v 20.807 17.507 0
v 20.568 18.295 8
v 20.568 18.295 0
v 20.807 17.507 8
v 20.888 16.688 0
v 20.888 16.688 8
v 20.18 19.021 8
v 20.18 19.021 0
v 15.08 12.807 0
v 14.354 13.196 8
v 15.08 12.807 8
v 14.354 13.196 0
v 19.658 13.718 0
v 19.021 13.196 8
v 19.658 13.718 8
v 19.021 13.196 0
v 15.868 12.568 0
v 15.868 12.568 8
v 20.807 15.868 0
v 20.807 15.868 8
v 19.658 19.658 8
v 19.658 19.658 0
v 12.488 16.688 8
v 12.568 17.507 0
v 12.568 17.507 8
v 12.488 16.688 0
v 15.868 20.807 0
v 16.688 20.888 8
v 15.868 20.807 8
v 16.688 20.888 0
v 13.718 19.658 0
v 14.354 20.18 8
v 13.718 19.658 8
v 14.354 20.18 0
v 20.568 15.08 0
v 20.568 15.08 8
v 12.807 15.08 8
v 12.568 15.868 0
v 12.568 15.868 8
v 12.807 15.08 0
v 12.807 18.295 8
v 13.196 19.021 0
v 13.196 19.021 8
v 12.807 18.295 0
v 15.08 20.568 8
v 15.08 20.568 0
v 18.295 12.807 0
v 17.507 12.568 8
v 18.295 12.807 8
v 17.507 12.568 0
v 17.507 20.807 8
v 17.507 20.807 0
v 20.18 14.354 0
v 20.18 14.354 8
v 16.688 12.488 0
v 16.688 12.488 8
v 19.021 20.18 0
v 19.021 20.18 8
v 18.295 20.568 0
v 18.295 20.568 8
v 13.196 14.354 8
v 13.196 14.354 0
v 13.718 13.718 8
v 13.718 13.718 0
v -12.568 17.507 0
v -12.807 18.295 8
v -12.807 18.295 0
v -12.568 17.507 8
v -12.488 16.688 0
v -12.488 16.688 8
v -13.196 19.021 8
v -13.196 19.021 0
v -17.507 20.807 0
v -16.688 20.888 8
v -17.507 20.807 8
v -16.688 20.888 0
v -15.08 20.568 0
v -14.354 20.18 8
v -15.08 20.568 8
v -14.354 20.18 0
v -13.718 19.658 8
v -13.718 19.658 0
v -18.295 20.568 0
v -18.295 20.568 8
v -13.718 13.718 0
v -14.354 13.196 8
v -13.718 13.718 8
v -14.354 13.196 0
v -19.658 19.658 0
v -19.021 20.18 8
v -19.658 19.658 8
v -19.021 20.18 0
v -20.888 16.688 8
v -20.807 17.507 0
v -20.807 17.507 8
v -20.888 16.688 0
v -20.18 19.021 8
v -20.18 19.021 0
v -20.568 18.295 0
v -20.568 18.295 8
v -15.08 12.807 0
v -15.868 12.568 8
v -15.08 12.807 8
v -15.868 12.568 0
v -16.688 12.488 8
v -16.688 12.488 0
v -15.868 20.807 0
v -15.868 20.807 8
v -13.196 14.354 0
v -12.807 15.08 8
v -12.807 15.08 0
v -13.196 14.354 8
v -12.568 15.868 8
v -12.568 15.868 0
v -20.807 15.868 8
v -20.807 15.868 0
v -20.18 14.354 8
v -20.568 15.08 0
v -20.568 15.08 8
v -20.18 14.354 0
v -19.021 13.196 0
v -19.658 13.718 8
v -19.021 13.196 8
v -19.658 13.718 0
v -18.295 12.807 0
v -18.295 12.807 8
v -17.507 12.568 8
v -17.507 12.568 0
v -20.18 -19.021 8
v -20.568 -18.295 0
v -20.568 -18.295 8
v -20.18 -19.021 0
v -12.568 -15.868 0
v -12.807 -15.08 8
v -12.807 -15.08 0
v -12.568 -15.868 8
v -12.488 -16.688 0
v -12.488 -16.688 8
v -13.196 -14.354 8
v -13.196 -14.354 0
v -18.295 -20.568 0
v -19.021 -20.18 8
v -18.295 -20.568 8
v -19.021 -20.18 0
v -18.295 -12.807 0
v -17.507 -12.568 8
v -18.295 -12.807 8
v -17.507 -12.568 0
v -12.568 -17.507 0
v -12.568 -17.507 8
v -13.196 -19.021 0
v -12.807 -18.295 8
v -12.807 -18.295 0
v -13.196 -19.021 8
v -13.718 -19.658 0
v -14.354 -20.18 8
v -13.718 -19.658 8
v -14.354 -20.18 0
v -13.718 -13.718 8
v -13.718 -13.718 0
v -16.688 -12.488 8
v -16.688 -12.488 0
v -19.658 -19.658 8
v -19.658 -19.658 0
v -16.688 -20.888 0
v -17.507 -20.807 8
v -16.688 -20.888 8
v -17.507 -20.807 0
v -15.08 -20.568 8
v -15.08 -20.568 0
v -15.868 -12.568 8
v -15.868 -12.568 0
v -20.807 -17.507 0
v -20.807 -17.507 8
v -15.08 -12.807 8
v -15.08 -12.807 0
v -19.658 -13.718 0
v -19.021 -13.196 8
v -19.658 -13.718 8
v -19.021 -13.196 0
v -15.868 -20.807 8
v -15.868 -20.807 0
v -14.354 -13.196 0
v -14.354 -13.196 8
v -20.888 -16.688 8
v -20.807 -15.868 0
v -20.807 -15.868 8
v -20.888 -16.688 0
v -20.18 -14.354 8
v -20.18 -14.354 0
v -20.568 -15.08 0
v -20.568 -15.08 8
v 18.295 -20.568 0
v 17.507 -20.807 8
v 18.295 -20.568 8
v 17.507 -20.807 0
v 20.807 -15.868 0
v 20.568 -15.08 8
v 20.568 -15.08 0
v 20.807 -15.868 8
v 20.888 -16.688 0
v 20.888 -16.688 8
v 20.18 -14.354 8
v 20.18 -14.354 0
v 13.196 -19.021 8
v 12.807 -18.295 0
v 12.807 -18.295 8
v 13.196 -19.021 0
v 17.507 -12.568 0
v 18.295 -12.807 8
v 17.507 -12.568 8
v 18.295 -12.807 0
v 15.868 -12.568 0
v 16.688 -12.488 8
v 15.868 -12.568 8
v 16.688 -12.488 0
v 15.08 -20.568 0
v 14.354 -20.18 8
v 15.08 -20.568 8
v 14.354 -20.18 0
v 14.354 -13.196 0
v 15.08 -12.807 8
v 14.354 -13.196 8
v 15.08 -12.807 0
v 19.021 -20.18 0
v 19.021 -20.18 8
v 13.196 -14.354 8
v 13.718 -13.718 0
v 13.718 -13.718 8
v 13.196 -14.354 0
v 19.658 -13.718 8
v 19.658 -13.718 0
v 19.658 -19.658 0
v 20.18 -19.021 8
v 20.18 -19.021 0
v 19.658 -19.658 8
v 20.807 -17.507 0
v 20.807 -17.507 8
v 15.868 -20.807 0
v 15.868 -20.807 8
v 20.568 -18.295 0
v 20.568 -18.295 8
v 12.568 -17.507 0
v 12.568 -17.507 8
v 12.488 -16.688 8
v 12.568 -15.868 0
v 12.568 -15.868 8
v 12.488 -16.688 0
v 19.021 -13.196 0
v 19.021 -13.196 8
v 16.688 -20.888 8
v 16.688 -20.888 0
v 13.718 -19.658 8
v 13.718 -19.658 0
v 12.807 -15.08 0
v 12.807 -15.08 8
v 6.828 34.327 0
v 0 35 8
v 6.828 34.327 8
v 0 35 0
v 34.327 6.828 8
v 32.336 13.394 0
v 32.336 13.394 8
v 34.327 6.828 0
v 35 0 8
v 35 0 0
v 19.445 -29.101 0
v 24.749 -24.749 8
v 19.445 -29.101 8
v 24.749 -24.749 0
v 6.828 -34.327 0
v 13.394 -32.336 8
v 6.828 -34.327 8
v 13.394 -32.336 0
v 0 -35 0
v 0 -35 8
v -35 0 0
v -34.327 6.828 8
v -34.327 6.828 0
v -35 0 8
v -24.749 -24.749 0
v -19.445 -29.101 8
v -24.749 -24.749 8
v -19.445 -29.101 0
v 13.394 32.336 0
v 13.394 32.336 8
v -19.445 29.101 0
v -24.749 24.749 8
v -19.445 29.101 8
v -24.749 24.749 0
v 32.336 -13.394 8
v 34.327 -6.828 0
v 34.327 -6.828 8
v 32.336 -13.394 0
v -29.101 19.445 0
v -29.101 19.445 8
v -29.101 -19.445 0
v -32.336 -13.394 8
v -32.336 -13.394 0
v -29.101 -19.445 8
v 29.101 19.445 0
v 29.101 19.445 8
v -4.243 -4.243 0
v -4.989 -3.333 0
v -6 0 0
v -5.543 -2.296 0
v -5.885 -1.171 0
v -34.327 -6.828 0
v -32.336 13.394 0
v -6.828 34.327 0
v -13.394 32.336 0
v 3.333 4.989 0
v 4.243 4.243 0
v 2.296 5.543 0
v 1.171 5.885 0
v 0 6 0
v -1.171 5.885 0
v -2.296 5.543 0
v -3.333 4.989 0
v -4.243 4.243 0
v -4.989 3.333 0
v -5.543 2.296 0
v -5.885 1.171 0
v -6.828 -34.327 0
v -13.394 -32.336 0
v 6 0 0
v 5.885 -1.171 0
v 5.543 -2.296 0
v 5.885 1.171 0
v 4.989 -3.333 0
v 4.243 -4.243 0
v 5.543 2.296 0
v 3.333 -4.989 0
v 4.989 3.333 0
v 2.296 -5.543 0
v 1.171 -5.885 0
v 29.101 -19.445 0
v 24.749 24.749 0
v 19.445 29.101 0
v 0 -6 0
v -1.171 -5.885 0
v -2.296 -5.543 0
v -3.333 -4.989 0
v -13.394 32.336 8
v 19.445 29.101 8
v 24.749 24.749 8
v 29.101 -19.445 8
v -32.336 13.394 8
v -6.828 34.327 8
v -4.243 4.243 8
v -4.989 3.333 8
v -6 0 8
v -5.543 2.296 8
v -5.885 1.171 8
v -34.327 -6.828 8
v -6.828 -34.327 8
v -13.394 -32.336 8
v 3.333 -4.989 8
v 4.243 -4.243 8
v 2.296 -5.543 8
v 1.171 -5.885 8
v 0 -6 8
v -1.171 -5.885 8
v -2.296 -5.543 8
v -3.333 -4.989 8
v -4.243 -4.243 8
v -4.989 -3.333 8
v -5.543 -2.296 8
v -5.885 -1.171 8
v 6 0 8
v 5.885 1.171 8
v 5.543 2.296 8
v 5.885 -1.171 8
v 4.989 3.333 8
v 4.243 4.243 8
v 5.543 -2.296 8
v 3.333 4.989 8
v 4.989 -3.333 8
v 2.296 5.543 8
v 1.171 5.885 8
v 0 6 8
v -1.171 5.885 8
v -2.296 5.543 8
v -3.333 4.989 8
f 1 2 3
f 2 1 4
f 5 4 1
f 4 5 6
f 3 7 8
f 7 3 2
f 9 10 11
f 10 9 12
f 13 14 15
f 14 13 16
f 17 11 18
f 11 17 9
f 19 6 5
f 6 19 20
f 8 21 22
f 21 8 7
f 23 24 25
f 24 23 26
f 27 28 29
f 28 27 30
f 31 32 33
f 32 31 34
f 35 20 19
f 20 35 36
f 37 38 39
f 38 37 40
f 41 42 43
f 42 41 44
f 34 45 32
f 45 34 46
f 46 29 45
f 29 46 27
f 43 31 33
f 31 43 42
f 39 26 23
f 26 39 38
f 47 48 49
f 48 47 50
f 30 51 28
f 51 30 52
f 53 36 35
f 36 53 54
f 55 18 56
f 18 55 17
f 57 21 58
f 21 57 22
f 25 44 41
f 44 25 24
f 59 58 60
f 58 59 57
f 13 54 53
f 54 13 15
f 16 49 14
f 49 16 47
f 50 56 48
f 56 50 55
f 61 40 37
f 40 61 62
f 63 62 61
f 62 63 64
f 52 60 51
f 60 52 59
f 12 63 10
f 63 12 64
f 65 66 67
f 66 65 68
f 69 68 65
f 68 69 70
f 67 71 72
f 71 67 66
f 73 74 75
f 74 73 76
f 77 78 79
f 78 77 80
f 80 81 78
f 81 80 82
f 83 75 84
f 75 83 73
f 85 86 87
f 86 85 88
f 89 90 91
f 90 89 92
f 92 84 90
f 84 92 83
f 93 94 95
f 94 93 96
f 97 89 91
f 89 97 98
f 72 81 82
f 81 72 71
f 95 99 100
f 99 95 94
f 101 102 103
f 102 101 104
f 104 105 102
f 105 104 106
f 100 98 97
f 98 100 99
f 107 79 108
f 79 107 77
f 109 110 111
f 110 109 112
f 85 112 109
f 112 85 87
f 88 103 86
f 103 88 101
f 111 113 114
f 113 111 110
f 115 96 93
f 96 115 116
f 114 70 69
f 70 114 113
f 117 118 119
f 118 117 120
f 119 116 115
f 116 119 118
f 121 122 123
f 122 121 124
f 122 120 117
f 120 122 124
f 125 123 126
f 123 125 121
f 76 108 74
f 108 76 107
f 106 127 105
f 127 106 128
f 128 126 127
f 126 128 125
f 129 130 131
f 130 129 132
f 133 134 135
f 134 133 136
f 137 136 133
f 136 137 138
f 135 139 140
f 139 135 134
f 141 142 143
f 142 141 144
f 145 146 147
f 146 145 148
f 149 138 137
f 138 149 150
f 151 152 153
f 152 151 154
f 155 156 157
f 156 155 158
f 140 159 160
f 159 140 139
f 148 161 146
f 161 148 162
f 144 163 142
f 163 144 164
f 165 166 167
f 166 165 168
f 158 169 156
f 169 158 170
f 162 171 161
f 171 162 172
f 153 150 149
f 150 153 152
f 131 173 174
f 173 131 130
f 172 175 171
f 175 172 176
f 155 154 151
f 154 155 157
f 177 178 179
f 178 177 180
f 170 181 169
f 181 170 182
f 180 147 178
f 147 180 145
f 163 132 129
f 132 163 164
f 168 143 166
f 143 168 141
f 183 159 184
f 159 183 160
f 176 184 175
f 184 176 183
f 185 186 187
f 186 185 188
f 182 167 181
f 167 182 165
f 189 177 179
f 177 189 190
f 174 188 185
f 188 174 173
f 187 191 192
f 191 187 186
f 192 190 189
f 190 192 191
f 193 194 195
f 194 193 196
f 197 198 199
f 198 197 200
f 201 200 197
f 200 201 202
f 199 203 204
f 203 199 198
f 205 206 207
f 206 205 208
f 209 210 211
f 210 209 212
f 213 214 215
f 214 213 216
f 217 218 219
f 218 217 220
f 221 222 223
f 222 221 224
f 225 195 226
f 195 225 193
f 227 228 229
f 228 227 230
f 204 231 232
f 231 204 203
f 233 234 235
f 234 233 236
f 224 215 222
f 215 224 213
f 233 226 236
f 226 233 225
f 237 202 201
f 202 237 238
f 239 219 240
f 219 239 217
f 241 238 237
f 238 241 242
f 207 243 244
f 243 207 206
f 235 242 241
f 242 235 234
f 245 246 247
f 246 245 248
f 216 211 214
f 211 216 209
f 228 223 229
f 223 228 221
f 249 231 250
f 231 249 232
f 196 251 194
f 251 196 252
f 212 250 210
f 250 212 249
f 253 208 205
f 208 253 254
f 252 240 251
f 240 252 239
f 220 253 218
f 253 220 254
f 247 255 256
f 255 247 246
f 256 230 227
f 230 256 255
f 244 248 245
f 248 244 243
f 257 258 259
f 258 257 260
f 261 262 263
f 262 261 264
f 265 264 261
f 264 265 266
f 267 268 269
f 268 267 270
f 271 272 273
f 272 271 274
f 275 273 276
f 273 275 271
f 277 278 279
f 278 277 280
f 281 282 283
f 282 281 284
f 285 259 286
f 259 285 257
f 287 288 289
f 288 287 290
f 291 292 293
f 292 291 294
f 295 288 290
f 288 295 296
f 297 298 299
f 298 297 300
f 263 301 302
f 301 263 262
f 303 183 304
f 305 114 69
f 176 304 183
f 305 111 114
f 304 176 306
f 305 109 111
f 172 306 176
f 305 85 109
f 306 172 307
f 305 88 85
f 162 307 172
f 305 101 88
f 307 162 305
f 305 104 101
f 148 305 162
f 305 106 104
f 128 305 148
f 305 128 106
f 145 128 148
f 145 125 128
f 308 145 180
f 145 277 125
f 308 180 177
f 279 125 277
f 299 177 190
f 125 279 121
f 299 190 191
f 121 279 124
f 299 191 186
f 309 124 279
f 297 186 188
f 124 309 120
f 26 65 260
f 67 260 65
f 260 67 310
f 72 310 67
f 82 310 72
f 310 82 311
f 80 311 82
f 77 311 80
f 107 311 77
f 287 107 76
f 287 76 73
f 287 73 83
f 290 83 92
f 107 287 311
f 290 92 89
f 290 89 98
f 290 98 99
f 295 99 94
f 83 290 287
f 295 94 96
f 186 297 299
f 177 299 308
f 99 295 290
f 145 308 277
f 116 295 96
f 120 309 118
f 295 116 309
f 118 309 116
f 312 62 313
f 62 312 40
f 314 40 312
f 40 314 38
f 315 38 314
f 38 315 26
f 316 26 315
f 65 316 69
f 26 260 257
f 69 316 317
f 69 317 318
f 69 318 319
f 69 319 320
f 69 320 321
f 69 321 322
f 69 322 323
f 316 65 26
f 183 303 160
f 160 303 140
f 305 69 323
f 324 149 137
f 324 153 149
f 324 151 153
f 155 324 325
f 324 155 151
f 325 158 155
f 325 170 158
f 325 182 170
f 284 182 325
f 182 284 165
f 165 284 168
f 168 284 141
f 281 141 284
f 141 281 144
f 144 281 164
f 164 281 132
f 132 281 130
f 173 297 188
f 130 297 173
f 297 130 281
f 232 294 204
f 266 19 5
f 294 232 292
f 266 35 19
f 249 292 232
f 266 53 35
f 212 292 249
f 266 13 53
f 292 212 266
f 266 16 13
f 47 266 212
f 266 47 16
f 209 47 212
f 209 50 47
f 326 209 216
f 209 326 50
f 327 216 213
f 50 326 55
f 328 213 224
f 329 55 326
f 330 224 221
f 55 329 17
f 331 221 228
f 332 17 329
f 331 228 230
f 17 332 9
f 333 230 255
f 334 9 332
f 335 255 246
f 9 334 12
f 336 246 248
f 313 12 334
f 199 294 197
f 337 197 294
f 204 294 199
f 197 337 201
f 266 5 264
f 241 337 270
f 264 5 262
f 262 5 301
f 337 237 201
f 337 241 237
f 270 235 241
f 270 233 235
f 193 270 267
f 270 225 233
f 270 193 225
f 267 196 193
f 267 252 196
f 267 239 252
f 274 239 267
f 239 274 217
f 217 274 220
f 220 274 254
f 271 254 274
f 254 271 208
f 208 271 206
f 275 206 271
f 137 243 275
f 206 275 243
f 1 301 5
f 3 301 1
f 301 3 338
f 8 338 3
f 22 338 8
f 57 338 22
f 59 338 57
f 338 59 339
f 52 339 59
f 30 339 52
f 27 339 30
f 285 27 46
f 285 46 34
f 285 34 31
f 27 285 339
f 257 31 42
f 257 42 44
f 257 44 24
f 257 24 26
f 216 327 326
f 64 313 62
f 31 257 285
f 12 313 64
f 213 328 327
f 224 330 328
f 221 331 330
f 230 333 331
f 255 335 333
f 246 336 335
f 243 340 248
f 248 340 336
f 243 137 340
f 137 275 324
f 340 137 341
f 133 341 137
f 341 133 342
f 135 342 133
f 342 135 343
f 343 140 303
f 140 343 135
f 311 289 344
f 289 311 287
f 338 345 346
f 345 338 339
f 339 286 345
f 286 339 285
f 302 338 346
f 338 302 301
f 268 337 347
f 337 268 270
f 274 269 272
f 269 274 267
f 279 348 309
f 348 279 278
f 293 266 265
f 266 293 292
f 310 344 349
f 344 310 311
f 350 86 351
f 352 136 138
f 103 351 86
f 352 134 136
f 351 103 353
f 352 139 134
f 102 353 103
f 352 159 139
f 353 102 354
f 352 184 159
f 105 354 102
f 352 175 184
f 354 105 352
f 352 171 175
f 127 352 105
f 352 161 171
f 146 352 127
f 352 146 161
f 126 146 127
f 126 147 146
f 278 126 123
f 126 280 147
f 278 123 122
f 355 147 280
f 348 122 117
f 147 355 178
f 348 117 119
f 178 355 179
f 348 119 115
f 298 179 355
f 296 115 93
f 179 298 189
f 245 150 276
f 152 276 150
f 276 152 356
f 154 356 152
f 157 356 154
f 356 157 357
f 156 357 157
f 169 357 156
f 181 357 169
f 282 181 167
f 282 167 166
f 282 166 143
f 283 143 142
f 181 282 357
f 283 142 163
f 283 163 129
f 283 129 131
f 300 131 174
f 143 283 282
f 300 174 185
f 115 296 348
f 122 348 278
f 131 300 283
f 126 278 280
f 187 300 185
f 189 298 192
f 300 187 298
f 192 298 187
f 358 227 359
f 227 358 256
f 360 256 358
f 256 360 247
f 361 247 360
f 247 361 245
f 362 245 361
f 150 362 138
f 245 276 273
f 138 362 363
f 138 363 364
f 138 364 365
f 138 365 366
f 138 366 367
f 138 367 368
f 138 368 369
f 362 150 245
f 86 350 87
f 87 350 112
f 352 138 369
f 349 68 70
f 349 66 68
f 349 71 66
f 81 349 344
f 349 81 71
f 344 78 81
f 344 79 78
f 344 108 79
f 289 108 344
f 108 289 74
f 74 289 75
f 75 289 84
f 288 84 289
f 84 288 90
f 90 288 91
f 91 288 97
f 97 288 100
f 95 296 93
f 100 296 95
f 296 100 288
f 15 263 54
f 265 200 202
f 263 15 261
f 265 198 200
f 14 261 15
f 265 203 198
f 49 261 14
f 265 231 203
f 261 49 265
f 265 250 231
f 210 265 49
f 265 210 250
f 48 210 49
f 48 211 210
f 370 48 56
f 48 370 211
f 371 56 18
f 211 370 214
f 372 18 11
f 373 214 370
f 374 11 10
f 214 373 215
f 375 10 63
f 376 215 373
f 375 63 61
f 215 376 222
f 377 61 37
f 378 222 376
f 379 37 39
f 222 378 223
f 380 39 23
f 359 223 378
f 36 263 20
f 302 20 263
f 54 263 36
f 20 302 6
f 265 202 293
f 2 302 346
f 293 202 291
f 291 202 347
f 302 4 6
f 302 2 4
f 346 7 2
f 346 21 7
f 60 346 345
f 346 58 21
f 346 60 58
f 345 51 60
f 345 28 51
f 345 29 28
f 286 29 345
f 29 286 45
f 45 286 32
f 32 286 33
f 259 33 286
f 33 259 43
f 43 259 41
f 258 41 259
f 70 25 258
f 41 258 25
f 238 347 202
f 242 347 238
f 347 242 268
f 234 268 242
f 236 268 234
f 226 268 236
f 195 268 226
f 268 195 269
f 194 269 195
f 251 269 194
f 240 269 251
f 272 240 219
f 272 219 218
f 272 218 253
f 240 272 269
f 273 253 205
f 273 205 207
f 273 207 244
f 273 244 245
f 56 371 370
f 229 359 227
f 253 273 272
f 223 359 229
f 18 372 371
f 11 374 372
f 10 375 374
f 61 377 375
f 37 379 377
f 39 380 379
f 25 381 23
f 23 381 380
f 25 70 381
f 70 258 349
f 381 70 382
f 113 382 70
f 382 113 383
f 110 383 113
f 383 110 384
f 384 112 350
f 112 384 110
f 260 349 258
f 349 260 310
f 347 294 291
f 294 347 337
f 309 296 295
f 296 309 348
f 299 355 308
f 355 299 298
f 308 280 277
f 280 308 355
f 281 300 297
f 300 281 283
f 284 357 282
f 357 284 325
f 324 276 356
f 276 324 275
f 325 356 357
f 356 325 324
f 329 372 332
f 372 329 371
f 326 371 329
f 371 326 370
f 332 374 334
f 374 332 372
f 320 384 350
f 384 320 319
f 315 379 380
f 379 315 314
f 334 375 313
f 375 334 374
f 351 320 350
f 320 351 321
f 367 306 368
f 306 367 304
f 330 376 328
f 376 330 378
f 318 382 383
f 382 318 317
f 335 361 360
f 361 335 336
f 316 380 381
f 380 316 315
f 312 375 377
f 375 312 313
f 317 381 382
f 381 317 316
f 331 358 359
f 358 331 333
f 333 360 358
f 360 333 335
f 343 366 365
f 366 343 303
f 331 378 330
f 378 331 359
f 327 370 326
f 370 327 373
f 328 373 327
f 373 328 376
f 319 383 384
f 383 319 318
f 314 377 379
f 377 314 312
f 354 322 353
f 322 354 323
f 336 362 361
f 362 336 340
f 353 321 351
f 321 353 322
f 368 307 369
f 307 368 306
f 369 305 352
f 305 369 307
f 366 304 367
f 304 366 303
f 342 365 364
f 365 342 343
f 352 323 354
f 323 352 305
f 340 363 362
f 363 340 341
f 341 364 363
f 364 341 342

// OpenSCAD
$fn = 32;

// ----------------------------------------------------------------------
// Flange Ø70 x 8
// 4 holes on a Ø47.2 bolt circle, bolted joints
// ----------------------------------------------------------------------

// --- parameters (mm) ---
flange_d = 70;   // outside diameter of the flange
thickness = 8;   // flange thickness
holes = 4;       // number of bolt holes
pcd = 47.2;      // bolt circle diameter
start_deg = 45;  // angle of the first hole, from +X
hole_d = 8.4;    // bolt hole diameter
bore_d = 12;     // central through bore
hub_d = 24;      // hub outside diameter
hub_h = 0;       // hub height above the flange face (0 = no hub)

// --- derived feature positions (mm) ---
height = thickness + hub_h;  // = 8   overall height of the part
pcd_r = pcd / 2;             // = 23.6   bolt circle radius
hole_step = 360 / holes;     // = 90   angular pitch
feature_centers = [
  [pcd_r * cos(start_deg + 0 * hole_step), pcd_r * sin(start_deg + 0 * hole_step)],
  [pcd_r * cos(start_deg + 1 * hole_step), pcd_r * sin(start_deg + 1 * hole_step)],
  [pcd_r * cos(start_deg + 2 * hole_step), pcd_r * sin(start_deg + 2 * hole_step)],
  [pcd_r * cos(start_deg + 3 * hole_step), pcd_r * sin(start_deg + 3 * hole_step)]
];   // bolt hole centres on the pitch circle

// flange disc, every hole and the bore cut straight through
difference() {
  union() {
    cylinder(d = flange_d, h = thickness);
  }
  translate([0, 0, -1]) cylinder(d = bore_d, h = height + 2);  // bore, through
  for (centre = feature_centers)
    translate([centre[0], centre[1], -1]) cylinder(d = hole_d, h = thickness + 2);
}
